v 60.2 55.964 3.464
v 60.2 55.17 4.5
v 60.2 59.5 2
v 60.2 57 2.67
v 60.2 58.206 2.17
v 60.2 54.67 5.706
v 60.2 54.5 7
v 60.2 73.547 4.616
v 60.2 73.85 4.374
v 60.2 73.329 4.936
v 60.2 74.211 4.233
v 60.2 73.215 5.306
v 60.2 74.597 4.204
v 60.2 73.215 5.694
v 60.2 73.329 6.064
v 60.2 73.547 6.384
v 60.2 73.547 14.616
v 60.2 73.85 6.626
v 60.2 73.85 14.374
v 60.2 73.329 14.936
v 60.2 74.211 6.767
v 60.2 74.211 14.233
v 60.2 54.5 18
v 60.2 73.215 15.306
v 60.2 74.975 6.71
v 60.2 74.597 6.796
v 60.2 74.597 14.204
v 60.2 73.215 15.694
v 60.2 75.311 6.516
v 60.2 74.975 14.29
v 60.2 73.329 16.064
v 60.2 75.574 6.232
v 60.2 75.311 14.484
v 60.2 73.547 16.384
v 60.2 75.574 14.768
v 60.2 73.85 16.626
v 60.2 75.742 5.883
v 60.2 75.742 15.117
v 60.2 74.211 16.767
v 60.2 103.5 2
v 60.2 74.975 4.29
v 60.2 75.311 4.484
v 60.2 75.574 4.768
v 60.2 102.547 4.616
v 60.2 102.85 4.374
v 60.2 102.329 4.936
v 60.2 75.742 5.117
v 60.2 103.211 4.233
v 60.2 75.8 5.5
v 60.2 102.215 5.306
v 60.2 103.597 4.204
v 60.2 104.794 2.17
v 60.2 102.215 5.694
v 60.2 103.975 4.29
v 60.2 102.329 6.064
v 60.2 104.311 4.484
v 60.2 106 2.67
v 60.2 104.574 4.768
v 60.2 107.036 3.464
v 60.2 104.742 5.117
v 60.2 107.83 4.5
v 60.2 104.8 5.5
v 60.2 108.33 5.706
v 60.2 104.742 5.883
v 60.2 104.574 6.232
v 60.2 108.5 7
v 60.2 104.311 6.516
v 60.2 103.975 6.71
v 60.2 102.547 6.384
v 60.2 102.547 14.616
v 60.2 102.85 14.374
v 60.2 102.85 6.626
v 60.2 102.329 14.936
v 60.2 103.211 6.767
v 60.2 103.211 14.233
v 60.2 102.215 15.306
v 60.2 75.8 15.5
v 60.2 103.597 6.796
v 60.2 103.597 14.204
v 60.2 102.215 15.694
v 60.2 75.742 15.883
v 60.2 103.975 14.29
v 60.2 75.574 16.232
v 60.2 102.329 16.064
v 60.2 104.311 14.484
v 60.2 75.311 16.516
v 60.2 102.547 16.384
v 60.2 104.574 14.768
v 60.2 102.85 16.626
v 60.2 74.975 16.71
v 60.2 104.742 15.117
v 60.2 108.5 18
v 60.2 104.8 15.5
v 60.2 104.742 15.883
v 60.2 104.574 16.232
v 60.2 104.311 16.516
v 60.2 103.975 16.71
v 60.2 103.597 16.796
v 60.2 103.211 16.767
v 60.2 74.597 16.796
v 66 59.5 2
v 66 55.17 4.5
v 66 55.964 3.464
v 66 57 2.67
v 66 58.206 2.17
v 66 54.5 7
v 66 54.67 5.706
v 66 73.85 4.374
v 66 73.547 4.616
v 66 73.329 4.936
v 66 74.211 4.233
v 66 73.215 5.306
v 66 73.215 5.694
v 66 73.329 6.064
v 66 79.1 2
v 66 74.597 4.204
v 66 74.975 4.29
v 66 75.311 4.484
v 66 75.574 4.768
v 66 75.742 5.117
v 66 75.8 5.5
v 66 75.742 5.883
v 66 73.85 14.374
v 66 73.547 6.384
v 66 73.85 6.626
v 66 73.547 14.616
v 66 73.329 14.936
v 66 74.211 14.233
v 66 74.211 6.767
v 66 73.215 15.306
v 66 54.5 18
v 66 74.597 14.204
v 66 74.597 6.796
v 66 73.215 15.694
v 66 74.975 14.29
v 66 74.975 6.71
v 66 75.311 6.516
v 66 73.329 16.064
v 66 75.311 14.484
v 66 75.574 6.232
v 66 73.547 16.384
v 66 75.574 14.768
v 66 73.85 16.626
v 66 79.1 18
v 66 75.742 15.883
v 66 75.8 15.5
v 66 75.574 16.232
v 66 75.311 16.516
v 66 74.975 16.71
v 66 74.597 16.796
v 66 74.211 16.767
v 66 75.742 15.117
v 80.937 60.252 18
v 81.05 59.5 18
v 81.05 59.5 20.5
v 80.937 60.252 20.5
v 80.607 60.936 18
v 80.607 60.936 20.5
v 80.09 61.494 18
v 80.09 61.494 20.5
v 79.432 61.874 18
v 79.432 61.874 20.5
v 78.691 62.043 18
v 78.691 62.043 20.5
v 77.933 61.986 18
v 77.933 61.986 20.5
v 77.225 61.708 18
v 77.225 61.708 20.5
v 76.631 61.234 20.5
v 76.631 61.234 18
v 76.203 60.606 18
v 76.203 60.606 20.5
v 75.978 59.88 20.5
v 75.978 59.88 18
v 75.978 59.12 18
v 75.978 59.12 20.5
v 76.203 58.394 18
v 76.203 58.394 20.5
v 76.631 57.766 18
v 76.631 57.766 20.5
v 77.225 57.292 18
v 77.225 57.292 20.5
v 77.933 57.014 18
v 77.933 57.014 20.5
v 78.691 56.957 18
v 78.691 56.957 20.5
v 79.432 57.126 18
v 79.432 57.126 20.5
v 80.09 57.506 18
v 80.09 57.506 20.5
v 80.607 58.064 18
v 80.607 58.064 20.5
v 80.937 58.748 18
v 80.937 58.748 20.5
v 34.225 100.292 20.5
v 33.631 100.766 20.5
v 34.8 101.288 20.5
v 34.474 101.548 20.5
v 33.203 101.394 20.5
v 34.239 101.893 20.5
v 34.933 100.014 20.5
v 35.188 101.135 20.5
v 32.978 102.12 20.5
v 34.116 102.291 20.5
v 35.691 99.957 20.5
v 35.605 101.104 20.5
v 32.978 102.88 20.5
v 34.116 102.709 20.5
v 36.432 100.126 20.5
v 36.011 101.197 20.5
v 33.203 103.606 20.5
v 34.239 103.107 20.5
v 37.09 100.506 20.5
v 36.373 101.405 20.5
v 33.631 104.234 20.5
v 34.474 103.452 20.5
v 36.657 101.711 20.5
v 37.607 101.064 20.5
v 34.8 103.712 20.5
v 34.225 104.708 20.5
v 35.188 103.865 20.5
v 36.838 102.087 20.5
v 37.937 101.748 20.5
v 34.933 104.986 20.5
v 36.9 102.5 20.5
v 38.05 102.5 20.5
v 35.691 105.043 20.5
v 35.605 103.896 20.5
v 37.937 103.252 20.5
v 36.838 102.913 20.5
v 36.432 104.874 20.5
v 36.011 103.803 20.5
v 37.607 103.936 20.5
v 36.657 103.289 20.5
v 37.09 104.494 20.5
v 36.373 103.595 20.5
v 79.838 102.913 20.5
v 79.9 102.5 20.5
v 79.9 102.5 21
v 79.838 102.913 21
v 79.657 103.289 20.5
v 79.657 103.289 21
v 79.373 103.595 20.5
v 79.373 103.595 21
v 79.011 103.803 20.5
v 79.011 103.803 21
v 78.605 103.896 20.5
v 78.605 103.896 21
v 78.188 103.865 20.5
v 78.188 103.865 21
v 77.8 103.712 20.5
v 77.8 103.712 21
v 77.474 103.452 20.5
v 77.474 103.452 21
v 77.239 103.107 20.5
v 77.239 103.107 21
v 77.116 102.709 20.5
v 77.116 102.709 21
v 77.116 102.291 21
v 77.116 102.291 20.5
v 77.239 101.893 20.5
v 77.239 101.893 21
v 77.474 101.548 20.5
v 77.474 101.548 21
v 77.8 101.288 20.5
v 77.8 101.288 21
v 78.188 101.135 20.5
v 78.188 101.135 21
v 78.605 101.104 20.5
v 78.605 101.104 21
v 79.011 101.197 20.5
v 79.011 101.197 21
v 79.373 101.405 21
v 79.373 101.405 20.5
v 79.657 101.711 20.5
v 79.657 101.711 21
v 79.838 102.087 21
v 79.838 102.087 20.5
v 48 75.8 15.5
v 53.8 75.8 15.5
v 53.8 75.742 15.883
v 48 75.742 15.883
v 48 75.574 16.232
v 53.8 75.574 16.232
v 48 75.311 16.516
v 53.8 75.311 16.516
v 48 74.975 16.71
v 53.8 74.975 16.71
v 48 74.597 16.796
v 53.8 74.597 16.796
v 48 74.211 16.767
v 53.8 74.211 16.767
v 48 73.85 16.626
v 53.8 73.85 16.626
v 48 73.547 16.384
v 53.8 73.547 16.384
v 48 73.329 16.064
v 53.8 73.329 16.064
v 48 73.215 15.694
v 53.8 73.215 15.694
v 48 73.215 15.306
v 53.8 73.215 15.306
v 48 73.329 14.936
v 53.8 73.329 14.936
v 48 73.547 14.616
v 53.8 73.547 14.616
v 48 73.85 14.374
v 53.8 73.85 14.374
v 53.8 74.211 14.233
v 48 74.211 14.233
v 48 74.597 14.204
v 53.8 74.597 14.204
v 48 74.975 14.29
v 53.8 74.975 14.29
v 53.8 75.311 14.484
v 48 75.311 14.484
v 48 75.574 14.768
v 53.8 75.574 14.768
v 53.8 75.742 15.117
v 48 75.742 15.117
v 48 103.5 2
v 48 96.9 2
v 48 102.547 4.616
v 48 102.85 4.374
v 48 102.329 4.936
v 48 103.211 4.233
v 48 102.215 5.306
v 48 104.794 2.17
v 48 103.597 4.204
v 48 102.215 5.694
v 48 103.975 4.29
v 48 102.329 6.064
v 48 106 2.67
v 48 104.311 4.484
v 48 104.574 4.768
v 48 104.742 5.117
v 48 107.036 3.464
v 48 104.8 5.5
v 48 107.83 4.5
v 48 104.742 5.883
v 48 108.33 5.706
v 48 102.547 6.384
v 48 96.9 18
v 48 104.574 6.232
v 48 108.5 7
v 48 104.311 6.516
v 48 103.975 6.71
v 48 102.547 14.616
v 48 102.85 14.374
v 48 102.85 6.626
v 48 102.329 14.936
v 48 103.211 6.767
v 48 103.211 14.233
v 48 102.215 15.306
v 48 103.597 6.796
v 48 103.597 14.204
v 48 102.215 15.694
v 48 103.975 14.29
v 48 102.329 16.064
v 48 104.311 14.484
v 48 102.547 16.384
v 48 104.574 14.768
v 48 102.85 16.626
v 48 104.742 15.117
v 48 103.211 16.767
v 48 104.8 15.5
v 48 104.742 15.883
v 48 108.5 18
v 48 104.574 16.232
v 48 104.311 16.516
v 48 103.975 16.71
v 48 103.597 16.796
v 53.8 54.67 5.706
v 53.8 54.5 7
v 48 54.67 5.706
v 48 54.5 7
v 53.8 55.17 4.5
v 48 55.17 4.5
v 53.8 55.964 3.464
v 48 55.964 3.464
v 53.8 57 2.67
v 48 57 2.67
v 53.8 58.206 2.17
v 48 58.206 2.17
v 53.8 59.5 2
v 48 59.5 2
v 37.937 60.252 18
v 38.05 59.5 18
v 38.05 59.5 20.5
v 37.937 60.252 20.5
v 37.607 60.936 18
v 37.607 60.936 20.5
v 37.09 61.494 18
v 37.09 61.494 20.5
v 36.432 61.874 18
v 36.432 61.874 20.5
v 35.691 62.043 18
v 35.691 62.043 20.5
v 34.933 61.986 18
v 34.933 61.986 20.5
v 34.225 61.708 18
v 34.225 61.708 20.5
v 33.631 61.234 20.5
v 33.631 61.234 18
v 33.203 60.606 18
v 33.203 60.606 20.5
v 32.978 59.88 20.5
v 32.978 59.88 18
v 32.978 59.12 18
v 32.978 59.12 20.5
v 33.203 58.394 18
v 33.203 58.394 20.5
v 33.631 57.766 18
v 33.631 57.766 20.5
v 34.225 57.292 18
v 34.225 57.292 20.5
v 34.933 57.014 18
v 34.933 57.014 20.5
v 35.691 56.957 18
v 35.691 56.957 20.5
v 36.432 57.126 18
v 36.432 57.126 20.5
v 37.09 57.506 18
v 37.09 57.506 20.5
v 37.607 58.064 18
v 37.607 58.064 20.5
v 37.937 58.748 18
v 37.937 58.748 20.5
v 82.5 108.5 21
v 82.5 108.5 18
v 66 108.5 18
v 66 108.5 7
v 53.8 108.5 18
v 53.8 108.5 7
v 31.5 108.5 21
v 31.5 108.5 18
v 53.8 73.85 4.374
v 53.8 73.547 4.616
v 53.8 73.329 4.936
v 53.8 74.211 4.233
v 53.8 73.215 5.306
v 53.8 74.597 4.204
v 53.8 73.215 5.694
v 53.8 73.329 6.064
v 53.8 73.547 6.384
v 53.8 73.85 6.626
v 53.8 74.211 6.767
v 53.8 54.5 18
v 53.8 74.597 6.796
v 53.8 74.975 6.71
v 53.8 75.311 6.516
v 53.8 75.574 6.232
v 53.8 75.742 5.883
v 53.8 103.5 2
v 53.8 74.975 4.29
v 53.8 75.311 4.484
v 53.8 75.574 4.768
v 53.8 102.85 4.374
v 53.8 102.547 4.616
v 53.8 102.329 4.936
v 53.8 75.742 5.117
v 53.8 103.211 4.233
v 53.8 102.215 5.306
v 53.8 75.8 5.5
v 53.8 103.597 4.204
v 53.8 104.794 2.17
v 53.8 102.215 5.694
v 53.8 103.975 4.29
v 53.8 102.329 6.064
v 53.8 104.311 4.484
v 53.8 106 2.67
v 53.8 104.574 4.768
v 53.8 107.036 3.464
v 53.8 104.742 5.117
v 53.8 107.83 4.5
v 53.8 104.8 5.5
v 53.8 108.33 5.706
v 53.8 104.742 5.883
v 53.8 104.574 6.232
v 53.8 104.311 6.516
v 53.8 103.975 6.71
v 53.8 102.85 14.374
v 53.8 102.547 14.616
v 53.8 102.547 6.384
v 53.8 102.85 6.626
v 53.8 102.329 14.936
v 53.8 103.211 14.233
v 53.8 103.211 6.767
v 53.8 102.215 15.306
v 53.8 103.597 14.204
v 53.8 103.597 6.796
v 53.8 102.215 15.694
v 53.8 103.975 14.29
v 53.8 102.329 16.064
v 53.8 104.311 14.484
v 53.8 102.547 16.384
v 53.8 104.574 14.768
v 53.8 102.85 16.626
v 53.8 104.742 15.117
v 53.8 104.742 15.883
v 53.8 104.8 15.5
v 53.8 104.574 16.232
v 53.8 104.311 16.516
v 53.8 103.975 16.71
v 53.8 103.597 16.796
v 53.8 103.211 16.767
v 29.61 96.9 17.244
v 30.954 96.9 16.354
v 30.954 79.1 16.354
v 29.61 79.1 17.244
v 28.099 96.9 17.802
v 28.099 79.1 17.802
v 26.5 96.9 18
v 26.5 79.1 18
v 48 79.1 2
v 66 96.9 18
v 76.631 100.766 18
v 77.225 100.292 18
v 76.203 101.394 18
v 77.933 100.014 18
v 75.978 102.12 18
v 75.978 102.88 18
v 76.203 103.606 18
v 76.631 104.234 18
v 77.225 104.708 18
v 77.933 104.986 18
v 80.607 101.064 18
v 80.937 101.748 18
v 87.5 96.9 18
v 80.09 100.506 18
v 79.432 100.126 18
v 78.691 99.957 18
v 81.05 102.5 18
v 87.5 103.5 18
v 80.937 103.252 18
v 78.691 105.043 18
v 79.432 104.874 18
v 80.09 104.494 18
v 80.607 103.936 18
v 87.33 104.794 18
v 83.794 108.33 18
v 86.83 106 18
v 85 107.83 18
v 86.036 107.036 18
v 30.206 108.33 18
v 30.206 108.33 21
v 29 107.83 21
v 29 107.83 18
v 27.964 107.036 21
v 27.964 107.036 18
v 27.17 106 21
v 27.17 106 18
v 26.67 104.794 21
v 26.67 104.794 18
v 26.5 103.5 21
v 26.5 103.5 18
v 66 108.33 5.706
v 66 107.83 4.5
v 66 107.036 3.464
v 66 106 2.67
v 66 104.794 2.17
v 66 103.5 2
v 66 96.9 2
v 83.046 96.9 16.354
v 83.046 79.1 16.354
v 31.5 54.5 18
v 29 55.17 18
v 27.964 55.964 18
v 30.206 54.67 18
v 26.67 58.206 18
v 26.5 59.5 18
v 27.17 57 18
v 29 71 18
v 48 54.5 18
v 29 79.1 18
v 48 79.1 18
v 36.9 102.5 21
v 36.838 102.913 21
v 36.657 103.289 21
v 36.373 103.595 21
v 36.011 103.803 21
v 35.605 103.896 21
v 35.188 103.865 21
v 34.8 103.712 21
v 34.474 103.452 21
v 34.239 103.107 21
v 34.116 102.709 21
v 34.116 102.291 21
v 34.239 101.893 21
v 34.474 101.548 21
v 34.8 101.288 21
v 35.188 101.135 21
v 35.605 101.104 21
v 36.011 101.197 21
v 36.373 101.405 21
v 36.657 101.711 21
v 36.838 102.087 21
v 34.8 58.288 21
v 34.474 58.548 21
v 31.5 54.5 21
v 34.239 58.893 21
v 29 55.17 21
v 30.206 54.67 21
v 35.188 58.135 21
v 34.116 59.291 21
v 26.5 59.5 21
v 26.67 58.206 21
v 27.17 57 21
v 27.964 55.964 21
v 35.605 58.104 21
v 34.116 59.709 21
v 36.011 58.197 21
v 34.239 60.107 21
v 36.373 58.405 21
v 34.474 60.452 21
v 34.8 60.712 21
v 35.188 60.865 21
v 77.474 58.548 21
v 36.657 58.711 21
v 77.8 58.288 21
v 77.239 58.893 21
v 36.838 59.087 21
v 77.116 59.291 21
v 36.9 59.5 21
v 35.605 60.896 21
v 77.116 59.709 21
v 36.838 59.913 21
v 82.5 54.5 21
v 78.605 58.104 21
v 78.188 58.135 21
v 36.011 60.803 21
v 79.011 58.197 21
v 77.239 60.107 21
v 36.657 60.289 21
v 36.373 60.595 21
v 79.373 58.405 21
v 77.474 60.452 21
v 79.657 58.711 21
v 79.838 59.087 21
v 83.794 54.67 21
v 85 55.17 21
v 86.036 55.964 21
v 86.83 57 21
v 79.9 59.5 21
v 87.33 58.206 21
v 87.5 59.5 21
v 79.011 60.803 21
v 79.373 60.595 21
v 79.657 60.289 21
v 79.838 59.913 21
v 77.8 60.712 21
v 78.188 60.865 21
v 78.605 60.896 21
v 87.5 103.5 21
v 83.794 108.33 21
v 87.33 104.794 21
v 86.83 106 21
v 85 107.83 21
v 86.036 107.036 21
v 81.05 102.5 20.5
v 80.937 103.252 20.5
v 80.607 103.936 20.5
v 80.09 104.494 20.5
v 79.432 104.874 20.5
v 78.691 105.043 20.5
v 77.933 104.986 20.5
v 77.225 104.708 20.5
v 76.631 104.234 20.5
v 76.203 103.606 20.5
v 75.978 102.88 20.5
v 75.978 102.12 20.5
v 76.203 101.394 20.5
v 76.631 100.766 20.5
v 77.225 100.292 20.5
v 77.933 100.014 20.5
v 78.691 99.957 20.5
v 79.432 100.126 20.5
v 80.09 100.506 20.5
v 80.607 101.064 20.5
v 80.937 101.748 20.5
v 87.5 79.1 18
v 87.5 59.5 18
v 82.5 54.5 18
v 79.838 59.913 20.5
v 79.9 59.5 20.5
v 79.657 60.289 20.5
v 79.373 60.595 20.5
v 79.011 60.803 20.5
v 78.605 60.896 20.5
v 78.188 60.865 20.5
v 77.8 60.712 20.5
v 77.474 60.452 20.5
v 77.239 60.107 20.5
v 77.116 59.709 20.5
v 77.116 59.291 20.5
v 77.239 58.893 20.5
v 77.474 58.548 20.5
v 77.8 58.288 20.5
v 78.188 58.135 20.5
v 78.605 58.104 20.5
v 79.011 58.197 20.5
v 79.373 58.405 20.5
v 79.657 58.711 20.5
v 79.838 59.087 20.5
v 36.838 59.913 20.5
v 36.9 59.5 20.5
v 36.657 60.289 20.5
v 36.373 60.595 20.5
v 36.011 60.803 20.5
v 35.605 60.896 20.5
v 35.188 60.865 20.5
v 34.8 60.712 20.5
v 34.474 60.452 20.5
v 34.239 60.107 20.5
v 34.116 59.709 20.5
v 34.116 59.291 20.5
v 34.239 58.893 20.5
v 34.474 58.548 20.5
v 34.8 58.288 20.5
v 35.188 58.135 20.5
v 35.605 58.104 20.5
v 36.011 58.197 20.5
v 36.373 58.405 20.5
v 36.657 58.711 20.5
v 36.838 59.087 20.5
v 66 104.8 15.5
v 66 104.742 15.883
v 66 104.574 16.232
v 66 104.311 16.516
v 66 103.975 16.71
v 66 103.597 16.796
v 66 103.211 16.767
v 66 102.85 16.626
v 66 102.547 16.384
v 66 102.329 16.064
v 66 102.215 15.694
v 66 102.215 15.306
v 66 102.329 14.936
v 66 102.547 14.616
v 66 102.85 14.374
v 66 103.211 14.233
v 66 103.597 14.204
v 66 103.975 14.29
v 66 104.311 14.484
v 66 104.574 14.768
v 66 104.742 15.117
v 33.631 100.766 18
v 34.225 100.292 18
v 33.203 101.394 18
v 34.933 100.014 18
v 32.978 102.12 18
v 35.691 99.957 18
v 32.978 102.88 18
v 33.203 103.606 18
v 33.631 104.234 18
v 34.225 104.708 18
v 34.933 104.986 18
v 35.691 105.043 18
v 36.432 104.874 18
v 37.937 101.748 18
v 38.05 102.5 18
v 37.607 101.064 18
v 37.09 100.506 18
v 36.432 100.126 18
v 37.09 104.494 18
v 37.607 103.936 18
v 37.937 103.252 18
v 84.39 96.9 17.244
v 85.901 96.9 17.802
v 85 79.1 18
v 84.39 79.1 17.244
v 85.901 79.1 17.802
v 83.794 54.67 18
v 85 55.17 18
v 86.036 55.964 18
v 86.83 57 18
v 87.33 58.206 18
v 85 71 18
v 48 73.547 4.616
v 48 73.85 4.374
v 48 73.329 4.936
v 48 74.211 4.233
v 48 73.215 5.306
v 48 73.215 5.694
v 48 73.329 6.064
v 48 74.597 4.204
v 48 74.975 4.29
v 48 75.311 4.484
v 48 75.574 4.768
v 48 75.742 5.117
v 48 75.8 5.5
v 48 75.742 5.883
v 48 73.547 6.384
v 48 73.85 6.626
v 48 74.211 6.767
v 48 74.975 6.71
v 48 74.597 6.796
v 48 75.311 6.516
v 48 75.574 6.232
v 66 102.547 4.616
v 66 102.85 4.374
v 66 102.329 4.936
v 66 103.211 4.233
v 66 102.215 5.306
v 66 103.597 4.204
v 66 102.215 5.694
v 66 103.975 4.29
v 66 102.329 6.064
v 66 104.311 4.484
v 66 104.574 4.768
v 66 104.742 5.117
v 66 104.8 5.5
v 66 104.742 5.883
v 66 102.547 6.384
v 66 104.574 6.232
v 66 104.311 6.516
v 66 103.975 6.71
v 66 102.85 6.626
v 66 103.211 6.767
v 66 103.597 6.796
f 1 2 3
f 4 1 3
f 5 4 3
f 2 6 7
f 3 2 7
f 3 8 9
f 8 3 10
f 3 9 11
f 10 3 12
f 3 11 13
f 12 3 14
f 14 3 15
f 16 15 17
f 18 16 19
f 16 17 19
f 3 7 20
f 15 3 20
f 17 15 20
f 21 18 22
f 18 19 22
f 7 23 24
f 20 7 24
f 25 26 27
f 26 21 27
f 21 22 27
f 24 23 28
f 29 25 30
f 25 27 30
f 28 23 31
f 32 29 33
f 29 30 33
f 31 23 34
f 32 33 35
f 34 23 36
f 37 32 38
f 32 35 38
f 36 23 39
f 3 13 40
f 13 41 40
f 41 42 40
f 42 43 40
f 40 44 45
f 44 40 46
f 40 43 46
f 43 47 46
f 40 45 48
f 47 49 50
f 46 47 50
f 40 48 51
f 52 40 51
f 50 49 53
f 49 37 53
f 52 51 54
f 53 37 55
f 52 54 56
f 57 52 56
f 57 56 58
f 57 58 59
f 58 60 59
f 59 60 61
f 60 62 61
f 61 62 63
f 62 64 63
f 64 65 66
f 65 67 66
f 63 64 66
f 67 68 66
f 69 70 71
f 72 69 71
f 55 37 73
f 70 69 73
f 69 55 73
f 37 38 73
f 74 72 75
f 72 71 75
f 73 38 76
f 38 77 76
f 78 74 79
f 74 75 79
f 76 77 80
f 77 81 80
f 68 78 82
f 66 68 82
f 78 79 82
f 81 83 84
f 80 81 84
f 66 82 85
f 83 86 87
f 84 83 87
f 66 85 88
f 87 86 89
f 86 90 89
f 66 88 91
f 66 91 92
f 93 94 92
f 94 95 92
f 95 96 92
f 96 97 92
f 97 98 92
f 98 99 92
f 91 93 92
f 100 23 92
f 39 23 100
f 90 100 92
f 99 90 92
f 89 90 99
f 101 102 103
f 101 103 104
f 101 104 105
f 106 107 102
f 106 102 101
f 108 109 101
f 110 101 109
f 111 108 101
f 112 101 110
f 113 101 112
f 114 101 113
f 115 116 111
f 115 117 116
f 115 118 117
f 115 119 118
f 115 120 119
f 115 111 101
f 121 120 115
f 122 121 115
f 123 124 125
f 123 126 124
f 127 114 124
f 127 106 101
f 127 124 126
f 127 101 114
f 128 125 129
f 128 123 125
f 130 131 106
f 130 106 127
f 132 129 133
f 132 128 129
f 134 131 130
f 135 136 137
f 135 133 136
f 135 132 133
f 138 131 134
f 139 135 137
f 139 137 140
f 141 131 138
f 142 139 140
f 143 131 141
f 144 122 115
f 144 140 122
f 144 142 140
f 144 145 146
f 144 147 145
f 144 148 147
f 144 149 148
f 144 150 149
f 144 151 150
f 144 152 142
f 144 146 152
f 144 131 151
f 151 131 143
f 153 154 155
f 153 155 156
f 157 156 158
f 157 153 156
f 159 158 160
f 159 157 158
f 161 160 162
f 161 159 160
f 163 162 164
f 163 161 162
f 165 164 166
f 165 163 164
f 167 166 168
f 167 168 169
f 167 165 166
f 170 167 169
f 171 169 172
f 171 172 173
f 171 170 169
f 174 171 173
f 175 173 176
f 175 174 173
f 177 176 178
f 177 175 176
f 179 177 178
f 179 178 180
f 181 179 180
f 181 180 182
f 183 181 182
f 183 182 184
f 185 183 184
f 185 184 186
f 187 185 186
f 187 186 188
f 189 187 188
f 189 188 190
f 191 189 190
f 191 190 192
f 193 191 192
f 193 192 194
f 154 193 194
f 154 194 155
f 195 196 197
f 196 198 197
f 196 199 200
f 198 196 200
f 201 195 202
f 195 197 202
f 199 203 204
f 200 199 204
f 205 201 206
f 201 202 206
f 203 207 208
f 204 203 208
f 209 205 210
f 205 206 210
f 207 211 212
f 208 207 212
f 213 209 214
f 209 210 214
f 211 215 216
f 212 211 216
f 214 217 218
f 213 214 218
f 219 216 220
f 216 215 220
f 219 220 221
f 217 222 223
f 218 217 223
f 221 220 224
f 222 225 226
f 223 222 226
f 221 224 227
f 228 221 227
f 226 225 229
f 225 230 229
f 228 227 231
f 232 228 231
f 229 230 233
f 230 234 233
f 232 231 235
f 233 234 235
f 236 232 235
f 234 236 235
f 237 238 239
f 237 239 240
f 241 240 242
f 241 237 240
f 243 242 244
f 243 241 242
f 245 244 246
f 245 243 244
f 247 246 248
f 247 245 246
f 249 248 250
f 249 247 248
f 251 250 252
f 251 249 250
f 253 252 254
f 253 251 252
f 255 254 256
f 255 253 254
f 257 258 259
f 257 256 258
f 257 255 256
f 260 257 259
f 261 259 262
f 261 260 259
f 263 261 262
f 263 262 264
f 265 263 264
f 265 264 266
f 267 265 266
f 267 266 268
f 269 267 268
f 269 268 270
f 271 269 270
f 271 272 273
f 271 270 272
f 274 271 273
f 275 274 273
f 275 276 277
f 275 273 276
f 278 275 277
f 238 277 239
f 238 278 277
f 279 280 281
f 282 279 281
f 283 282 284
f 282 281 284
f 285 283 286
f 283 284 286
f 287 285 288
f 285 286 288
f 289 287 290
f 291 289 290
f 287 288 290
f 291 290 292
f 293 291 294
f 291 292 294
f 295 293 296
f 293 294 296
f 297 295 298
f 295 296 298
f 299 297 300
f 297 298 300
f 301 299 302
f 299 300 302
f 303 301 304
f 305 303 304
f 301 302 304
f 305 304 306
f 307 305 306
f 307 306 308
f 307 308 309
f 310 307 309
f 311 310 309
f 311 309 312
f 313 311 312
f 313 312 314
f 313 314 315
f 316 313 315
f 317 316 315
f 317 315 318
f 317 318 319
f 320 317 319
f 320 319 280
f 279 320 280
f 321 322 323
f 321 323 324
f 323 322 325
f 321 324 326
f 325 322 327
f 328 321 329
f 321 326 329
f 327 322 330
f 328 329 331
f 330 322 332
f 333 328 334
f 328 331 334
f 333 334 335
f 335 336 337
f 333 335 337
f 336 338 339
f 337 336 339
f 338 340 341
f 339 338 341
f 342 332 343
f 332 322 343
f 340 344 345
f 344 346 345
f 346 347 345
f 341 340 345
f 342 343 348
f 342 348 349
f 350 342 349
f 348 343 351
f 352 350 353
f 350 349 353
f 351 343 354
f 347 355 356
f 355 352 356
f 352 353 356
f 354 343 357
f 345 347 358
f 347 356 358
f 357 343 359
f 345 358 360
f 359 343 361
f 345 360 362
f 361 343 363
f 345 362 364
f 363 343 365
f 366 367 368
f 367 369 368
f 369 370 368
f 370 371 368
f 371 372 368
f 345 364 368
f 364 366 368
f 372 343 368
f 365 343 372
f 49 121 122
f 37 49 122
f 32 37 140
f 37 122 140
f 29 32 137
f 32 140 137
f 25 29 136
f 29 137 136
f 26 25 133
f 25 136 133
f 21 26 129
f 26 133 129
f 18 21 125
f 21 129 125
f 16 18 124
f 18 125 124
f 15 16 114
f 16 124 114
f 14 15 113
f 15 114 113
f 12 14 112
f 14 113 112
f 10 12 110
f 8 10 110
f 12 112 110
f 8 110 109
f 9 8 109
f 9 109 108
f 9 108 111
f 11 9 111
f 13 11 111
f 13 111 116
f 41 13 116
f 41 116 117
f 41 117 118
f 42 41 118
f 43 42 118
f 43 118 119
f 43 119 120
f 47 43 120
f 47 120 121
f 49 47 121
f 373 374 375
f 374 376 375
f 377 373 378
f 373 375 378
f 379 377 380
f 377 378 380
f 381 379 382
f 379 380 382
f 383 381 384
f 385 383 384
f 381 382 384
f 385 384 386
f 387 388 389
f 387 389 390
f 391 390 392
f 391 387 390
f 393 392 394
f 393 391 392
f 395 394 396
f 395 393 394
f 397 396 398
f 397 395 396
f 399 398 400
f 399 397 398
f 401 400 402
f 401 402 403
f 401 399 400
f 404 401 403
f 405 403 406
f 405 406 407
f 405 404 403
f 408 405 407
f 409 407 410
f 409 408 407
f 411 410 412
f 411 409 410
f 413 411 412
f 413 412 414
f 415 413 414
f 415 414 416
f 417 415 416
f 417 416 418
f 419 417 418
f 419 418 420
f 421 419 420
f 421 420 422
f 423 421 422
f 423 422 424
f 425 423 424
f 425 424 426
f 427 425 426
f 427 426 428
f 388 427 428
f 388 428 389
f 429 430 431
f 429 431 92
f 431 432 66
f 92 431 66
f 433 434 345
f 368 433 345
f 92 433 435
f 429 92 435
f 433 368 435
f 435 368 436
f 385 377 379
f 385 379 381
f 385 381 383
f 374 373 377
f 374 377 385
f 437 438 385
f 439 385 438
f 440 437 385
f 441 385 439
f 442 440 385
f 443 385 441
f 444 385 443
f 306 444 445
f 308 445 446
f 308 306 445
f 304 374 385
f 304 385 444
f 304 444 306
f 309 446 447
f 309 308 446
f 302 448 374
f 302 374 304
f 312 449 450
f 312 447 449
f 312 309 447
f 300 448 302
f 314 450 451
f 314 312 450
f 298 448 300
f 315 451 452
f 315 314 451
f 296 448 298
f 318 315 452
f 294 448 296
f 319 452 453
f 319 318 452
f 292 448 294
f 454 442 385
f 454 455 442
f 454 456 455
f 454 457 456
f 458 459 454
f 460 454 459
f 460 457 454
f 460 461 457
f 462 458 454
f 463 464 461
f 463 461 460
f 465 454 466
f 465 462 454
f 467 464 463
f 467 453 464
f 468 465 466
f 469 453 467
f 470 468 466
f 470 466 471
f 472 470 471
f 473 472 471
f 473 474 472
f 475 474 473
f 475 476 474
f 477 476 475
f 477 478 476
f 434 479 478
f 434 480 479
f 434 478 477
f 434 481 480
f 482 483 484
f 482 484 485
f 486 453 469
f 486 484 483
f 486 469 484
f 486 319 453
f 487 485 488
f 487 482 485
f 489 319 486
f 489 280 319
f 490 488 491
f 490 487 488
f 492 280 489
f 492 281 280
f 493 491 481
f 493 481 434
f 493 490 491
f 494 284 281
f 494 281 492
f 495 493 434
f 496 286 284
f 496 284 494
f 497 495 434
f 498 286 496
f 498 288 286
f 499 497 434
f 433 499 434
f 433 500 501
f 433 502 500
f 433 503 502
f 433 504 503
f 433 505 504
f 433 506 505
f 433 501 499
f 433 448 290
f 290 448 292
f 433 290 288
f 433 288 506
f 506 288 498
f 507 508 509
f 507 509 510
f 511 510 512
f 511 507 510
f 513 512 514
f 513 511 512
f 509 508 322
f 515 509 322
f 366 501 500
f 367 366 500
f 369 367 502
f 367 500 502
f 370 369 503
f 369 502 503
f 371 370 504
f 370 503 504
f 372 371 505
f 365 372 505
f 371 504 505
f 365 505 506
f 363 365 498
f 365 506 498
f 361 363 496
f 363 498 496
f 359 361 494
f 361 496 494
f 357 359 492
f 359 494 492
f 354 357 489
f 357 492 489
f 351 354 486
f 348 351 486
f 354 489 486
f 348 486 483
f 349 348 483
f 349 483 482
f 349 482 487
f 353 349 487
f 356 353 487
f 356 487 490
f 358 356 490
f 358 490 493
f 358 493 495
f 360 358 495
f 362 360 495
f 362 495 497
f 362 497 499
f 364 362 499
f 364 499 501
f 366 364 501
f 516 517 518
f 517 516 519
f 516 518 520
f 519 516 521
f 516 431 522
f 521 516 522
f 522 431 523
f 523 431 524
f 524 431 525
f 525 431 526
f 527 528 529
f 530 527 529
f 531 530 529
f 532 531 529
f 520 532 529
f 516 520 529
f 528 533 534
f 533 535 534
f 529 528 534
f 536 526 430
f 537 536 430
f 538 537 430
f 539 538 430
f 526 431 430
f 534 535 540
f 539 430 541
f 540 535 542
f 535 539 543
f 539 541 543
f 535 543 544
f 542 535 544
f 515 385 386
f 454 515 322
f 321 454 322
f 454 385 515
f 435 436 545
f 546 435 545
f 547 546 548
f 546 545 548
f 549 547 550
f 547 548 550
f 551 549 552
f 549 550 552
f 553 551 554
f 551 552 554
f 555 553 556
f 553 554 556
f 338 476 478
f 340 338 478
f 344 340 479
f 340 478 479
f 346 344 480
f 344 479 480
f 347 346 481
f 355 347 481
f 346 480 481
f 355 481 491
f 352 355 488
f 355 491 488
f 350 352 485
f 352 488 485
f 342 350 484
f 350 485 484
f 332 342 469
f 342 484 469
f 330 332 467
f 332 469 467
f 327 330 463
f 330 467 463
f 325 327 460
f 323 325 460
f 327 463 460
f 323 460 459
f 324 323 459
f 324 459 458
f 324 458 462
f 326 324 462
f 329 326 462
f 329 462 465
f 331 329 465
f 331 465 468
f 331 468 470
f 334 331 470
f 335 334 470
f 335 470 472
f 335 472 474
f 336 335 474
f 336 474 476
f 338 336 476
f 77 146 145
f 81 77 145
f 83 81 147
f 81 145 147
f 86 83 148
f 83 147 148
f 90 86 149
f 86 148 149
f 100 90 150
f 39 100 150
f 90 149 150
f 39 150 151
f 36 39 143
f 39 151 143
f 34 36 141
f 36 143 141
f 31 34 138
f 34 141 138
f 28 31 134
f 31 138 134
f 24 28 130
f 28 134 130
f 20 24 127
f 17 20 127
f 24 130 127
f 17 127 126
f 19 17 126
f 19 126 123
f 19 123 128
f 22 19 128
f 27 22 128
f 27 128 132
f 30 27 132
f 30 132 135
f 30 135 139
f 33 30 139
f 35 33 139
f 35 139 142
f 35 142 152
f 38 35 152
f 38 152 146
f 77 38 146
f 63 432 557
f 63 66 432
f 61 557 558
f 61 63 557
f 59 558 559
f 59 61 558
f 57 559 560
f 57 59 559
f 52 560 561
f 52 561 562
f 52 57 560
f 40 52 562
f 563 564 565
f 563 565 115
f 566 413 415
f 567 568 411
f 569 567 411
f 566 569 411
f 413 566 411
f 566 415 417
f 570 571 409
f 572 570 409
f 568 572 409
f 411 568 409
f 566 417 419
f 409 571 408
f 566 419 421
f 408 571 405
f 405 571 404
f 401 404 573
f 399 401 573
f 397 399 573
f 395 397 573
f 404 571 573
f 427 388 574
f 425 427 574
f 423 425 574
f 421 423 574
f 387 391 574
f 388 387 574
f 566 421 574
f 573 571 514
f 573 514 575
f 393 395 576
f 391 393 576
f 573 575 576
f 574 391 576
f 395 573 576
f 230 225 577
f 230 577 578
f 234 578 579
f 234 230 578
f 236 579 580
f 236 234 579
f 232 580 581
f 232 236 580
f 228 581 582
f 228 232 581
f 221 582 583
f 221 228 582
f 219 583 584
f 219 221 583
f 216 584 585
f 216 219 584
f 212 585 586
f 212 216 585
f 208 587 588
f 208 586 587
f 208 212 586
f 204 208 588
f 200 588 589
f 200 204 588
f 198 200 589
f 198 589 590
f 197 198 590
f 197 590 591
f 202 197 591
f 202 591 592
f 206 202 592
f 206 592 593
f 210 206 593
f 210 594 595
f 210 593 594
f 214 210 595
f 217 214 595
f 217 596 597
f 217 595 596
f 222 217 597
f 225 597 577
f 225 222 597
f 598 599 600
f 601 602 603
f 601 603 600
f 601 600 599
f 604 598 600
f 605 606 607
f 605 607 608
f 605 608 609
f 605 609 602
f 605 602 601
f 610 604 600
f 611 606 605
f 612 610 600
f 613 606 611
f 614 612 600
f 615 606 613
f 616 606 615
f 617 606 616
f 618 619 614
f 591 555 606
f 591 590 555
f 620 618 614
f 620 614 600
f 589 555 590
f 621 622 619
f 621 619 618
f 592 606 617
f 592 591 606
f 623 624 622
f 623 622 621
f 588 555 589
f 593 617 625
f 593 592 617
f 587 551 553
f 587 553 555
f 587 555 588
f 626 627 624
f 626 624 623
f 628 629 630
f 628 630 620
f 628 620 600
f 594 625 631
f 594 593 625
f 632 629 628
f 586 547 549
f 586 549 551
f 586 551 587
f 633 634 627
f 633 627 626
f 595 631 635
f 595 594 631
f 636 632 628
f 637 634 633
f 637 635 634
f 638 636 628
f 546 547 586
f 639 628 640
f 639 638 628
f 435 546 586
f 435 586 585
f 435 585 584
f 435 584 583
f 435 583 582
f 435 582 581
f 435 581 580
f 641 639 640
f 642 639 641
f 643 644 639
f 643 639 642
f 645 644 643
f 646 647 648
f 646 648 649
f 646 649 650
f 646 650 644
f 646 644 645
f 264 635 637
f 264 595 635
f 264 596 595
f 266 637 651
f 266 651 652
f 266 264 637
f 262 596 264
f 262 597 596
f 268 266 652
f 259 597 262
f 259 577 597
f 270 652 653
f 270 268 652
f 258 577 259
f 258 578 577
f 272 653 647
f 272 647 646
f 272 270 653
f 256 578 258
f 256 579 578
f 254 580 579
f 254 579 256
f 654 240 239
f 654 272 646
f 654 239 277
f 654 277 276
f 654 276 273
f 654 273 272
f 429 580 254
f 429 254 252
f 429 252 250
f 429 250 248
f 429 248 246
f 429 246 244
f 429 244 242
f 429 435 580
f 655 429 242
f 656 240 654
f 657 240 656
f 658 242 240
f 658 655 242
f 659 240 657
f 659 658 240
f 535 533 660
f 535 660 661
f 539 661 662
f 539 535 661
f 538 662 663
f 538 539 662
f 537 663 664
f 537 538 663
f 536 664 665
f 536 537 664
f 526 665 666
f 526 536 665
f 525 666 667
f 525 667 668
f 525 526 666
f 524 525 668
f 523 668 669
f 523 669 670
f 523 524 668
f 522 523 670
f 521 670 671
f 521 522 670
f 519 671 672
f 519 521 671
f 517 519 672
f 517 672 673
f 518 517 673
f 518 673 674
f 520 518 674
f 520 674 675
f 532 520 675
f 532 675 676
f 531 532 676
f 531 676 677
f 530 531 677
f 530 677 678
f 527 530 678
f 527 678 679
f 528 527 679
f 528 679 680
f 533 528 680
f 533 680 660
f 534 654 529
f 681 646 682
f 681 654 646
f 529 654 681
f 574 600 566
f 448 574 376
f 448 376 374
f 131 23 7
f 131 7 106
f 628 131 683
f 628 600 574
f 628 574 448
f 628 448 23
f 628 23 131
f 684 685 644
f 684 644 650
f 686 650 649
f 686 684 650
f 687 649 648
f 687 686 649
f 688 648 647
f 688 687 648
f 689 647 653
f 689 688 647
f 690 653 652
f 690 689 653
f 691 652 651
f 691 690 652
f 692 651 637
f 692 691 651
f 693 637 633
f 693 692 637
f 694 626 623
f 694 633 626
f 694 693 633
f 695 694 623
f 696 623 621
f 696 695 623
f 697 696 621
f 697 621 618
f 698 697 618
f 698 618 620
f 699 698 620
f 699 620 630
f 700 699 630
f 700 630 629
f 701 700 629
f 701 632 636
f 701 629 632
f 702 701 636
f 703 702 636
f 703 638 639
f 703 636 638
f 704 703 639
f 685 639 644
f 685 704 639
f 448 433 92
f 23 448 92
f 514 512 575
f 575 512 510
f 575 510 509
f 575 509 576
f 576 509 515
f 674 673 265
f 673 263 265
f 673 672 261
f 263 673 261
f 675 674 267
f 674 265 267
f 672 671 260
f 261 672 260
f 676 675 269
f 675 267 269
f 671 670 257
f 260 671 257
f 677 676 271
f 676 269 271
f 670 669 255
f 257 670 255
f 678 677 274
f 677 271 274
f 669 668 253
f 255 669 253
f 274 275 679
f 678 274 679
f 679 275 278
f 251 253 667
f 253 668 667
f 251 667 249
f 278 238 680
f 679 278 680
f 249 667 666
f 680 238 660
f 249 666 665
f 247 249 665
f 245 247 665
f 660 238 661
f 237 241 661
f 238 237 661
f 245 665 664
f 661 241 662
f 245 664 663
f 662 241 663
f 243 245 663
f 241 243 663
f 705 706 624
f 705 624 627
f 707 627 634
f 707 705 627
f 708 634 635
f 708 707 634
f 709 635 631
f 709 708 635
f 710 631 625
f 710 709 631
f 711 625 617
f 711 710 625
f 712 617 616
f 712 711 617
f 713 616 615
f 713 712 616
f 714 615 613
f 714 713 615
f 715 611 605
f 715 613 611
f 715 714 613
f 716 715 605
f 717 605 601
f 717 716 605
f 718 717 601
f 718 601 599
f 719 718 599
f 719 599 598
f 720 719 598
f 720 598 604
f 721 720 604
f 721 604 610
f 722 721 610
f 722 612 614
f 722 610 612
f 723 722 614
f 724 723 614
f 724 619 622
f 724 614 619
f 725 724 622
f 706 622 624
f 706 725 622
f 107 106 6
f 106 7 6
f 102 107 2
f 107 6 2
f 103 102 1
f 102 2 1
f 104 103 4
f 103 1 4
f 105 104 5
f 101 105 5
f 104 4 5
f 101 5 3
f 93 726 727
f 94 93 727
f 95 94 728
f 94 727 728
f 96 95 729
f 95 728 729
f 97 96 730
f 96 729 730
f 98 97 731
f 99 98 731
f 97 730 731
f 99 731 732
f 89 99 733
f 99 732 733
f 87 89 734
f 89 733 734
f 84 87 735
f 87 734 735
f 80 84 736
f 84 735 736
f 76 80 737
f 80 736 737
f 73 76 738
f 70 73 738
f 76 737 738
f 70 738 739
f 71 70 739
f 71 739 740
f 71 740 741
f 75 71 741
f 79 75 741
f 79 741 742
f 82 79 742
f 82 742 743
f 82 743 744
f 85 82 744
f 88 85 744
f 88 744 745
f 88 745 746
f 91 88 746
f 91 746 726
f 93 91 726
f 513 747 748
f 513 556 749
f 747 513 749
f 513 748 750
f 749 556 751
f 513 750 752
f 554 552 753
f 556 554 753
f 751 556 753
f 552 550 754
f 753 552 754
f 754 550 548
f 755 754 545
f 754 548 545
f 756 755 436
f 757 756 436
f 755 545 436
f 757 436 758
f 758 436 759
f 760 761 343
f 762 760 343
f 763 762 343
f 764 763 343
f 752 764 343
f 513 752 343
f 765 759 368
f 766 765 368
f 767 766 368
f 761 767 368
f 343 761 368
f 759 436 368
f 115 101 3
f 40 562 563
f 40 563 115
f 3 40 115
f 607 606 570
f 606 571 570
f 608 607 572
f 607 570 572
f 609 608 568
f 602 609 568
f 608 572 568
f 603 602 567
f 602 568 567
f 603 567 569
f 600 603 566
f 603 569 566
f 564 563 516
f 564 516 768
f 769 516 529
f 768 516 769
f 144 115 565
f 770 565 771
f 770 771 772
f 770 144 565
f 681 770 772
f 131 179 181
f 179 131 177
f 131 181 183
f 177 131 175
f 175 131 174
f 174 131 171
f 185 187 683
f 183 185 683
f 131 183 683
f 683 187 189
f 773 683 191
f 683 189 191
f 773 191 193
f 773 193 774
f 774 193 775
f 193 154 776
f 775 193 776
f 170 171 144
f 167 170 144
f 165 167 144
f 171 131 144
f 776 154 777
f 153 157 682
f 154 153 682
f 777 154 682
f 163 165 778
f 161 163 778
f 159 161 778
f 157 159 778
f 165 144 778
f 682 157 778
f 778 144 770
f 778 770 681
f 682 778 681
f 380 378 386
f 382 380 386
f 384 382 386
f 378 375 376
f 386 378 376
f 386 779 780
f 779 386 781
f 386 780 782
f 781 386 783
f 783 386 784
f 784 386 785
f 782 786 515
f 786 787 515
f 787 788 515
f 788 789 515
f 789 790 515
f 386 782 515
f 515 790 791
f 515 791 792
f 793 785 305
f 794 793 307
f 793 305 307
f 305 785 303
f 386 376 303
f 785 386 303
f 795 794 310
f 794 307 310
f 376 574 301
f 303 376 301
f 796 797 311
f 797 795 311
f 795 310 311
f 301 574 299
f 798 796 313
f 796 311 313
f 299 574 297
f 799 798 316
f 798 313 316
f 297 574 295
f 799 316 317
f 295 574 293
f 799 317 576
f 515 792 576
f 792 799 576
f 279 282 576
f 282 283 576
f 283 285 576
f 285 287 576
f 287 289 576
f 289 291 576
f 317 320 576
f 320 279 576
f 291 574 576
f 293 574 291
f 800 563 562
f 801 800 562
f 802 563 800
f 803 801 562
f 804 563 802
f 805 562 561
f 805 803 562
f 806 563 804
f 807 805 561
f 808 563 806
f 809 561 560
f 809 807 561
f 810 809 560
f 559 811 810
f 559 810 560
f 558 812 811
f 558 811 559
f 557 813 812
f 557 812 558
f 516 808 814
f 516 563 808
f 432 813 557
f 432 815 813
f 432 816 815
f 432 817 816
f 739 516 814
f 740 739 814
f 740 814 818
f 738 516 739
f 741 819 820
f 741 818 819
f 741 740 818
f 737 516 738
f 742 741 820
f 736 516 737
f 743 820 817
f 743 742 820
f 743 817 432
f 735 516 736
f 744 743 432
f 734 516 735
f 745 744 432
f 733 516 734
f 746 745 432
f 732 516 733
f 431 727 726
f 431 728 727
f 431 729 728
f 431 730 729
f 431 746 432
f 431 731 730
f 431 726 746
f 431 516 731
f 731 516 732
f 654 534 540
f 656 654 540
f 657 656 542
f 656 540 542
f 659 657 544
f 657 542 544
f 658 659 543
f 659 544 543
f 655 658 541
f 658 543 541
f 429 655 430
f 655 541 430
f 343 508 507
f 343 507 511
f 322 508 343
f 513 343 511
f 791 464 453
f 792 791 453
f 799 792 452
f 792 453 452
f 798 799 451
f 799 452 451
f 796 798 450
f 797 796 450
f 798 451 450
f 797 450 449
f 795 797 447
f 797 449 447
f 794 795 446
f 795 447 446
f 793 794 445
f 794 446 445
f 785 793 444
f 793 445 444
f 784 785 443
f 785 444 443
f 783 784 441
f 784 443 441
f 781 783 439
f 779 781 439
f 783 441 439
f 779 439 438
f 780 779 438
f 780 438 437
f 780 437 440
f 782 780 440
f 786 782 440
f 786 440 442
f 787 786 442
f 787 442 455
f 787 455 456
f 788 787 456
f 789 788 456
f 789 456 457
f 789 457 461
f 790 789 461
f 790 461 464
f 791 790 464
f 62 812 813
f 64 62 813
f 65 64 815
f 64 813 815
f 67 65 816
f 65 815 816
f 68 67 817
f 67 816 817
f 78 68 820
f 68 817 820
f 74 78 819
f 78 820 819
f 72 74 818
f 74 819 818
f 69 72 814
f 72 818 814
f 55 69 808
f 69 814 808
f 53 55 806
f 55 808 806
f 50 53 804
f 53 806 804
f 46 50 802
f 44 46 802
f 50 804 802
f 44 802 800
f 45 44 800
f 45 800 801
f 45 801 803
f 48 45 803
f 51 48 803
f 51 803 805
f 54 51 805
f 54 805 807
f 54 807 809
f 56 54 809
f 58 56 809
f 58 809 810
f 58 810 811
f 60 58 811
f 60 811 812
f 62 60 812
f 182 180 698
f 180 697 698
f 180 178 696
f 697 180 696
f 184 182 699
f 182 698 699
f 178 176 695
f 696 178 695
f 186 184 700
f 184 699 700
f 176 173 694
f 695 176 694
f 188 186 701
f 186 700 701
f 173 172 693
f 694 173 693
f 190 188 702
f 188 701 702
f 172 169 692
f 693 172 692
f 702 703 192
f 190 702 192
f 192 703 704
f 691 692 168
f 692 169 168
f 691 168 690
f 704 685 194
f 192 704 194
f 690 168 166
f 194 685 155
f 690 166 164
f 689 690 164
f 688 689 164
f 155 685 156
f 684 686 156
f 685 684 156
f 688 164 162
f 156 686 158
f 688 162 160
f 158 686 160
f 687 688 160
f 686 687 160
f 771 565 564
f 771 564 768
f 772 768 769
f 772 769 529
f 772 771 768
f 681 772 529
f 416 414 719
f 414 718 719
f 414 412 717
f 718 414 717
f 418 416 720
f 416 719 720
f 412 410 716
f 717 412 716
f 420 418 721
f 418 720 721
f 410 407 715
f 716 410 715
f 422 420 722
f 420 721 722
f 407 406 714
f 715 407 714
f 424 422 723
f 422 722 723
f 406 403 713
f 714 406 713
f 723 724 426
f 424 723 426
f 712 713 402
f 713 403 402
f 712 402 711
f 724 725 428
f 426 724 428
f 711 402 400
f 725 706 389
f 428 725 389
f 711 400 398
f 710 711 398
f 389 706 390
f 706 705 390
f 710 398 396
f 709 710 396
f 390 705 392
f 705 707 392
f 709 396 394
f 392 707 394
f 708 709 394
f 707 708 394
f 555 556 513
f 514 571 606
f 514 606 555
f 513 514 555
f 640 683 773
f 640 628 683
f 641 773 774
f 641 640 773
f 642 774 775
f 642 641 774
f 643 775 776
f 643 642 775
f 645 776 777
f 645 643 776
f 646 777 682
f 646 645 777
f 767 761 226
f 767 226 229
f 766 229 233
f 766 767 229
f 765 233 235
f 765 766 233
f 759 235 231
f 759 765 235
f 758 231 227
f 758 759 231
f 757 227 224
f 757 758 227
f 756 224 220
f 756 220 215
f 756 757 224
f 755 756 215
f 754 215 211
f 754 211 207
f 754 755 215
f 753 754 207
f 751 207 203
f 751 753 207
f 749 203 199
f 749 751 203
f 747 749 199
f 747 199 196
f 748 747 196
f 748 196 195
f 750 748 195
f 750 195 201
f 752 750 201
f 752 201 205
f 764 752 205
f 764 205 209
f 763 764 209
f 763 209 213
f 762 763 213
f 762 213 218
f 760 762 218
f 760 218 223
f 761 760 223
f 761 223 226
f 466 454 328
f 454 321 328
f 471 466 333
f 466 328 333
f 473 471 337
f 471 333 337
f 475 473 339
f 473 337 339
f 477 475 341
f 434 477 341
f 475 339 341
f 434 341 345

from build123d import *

# Parameters (mm, degrees)
F_61_START                              = 18
F_61_X_61_RADAR_PLATFORM_DEPTH          = 3
C1_START                                = 17.9
C1_FOUR_CLEARANCES_43_X_43_MM_PROFILE_R = 1.4
C1_FOUR_CLEARANCES_43_X_43_MM_DEPTH     = 5.2
C1_SCREW_HEAD_POCKETS_PROFILE_R         = 2.55
C1_SCREW_HEAD_POCKETS_DEPTH             = 2.6
SKETCH_3_W                              = 5.8
SKETCH_3_H                              = 61
EXTRUDE_2_DEPTH                         = 16
SKETCH_4_R                              = 1.3
CUT_EXTRUDE_4_DEPTH                     = 25
SKETCH_5_W                              = 16
SKETCH_5_H                              = 17.8
EXTRUDE_3_DEPTH                         = 19
SKETCH_6_W                              = 19
SKETCH_6_H                              = 17.8
EXTRUDE_4_DEPTH                         = 16
CUT_EXTRUDE_5_DEPTH                     = 25.9
FILLET_4_R                              = 7
SKETCH_8_W                              = 61.060792307
SKETCH_8_H                              = 7.060792307
CUT_EXTRUDE_6_DEPTH                     = 25.9
FILLET_5_R                              = 5


with BuildPart() as part:
    # 61 x 61 radar platform profile → 61 x 61 radar platform (new body)
    with BuildSketch(Plane.XY.offset(F_61_START)):
        with BuildLine():
            Line((31.5, 47.5), (82.5, 47.5))
            ThreePointArc((82.5, 47.5), (86.035533906, 48.964466094), (87.5, 52.5))
            Line((87.5, 52.5), (87.5, 103.5))
            ThreePointArc((87.5, 103.5), (86.035533906, 107.035533906), (82.5, 108.5))
            Line((82.5, 108.5), (31.5, 108.5))
            ThreePointArc((31.5, 108.5), (27.964466094, 107.035533906), (26.5, 103.5))
            Line((26.5, 103.5), (26.5, 52.5))
            ThreePointArc((26.5, 52.5), (27.964466094, 48.964466094), (31.5, 47.5))
        make_face()
    extrude(amount=F_61_X_61_RADAR_PLATFORM_DEPTH)

    # C1 four clearances 43 x 43 mm profile → C1 four clearances 43 x 43 mm (cut)
    with BuildSketch(Plane.XY.offset(C1_START)):
        with Locations((35.5, 59.5)):
            Circle(C1_FOUR_CLEARANCES_43_X_43_MM_PROFILE_R)
        with Locations((35.5, 102.5)):
            Circle(C1_FOUR_CLEARANCES_43_X_43_MM_PROFILE_R)
        with Locations((78.5, 59.5)):
            Circle(C1_FOUR_CLEARANCES_43_X_43_MM_PROFILE_R)
        with Locations((78.5, 102.5)):
            Circle(C1_FOUR_CLEARANCES_43_X_43_MM_PROFILE_R)
    extrude(amount=C1_FOUR_CLEARANCES_43_X_43_MM_DEPTH, mode=Mode.SUBTRACT)

    # C1 screw head pockets profile → C1 screw head pockets (cut)
    with BuildSketch(Plane.XY.offset(C1_START)):
        with Locations((35.5, 59.5)):
            Circle(C1_SCREW_HEAD_POCKETS_PROFILE_R)
        with Locations((35.5, 102.5)):
            Circle(C1_SCREW_HEAD_POCKETS_PROFILE_R)
        with Locations((78.5, 59.5)):
            Circle(C1_SCREW_HEAD_POCKETS_PROFILE_R)
        with Locations((78.5, 102.5)):
            Circle(C1_SCREW_HEAD_POCKETS_PROFILE_R)
    extrude(amount=C1_SCREW_HEAD_POCKETS_DEPTH, mode=Mode.SUBTRACT)

    # 草图3 → 凸台-拉伸2 (add)
    with BuildSketch(Plane(origin=(0, 0, 18), x_dir=(-1, 0, 0), z_dir=(0, 0, -1))):
        with Locations((-63.1, 78)):
            Rectangle(SKETCH_3_W, SKETCH_3_H)
        with Locations((-50.9, 78)):
            Rectangle(SKETCH_3_W, SKETCH_3_H)
    extrude(amount=EXTRUDE_2_DEPTH)

    # 草图4 → 切除-拉伸4 (cut)
    with BuildSketch(Plane(origin=(66, 0, 0), x_dir=(0, 0, -1), z_dir=(1, 0, 0))):
        with Locations(Location((-15.5, 103.5, 0), (0, 0, 90))):
            Circle(SKETCH_4_R)
        with Locations(Location((-15.5, 74.5, 0), (0, 0, 90))):
            Circle(SKETCH_4_R)
        with Locations(Location((-5.5, 103.5, 0), (0, 0, 90))):
            Circle(SKETCH_4_R)
        with Locations(Location((-5.5, 74.5, 0), (0, 0, 90))):
            Circle(SKETCH_4_R)
    extrude(amount=-CUT_EXTRUDE_4_DEPTH, mode=Mode.SUBTRACT)

    # 草图5 → 凸台-拉伸3 (add)
    with BuildSketch(Plane(origin=(66, 0, 0), x_dir=(0, 0, -1), z_dir=(1, 0, 0))):
        with Locations((-10, 88)):
            Rectangle(SKETCH_5_W, SKETCH_5_H)
    extrude(amount=EXTRUDE_3_DEPTH)

    # 草图6 → 凸台-拉伸4 (add)
    with BuildSketch(Plane(origin=(0, 0, 18), x_dir=(-1, 0, 0), z_dir=(0, 0, -1))):
        with Locations((-38.5, 88)):
            Rectangle(SKETCH_6_W, SKETCH_6_H)
    extrude(amount=EXTRUDE_4_DEPTH)

    # 草图7 → 切除-拉伸5 (cut)
    with BuildSketch(Plane(origin=(0, 96.9, 0), x_dir=(1, 0, 0), z_dir=(0, 1, 0))):
        Polygon((66, -2), (85, -2), (85, -18), align=None)
        Polygon((48, -2), (29, -2), (29, -18), align=None)
    extrude(amount=-CUT_EXTRUDE_5_DEPTH, mode=Mode.SUBTRACT)

    # 圆角4
    # the kernel refuses this fillet: 7 mm, written as the material it adds along each edge
    with BuildSketch(Plane(origin=(85, 79.1, 18), x_dir=(-0.7649111981170483, 0, -0.6441357457827827), z_dir=(0, 1, 0))) as fillet_4_piece_1_section:
        with BuildLine():
            CenterArc((FILLET_4_R * 0.364967793547, -FILLET_4_R), FILLET_4_R, 90, 40.100907546)
            Line((-FILLET_4_R * 0.279167952236, -FILLET_4_R * 0.235088801883), (0, 0))
            Line((0, 0), (FILLET_4_R * 0.364967793547, 0))
        make_face()
    fillet_4_piece_1 = extrude(amount=17.8, mode=Mode.PRIVATE)
    fillet_4_piece_1 = split(fillet_4_piece_1, bisect_by=Plane(origin=(87.5, 88, 17.657135978), z_dir=(-1, 0, 0)), keep=Keep.TOP, mode=Mode.PRIVATE)
    add(fillet_4_piece_1)
    with BuildSketch(Plane(origin=(29, 96.9, 18), x_dir=(-1, 0, 0), z_dir=(0, -1, 0))) as fillet_4_piece_2_section:
        with BuildLine():
            CenterArc((FILLET_4_R * 0.364967793547, FILLET_4_R), FILLET_4_R, 229.899092454, 40.100907546)
            Line((-FILLET_4_R * 0.279167952236, FILLET_4_R * 0.235088801883), (0, 0))
            Line((0, 0), (FILLET_4_R * 0.364967793547, 0))
        make_face()
    fillet_4_piece_2 = extrude(amount=17.8, mode=Mode.PRIVATE)
    fillet_4_piece_2 = split(fillet_4_piece_2, bisect_by=Plane(origin=(26.5, 88, 17.657135978), z_dir=(1, 0, 0)), keep=Keep.TOP, mode=Mode.PRIVATE)
    add(fillet_4_piece_2)

    # 草图8 → 切除-拉伸6 (cut)
    with BuildSketch(Plane.XY.offset(21)):
        with Locations((57.030396153, 50.969603847)):
            Rectangle(SKETCH_8_W, SKETCH_8_H)
    extrude(amount=-CUT_EXTRUDE_6_DEPTH, mode=Mode.SUBTRACT)

    # 圆角5
    fillet_5_edges = [part.edges().sort_by_distance(p)[0] for p in [
        (63.1, 54.5, 2),
        (26.5, 54.5, 19.5),
        (87.5, 54.5, 19.5),
        (50.9, 54.5, 2),
        (63.1, 108.5, 2),
        (50.9, 108.5, 2),
    ]]
    fillet(fillet_5_edges, radius=FILLET_5_R)


solid = part.part
